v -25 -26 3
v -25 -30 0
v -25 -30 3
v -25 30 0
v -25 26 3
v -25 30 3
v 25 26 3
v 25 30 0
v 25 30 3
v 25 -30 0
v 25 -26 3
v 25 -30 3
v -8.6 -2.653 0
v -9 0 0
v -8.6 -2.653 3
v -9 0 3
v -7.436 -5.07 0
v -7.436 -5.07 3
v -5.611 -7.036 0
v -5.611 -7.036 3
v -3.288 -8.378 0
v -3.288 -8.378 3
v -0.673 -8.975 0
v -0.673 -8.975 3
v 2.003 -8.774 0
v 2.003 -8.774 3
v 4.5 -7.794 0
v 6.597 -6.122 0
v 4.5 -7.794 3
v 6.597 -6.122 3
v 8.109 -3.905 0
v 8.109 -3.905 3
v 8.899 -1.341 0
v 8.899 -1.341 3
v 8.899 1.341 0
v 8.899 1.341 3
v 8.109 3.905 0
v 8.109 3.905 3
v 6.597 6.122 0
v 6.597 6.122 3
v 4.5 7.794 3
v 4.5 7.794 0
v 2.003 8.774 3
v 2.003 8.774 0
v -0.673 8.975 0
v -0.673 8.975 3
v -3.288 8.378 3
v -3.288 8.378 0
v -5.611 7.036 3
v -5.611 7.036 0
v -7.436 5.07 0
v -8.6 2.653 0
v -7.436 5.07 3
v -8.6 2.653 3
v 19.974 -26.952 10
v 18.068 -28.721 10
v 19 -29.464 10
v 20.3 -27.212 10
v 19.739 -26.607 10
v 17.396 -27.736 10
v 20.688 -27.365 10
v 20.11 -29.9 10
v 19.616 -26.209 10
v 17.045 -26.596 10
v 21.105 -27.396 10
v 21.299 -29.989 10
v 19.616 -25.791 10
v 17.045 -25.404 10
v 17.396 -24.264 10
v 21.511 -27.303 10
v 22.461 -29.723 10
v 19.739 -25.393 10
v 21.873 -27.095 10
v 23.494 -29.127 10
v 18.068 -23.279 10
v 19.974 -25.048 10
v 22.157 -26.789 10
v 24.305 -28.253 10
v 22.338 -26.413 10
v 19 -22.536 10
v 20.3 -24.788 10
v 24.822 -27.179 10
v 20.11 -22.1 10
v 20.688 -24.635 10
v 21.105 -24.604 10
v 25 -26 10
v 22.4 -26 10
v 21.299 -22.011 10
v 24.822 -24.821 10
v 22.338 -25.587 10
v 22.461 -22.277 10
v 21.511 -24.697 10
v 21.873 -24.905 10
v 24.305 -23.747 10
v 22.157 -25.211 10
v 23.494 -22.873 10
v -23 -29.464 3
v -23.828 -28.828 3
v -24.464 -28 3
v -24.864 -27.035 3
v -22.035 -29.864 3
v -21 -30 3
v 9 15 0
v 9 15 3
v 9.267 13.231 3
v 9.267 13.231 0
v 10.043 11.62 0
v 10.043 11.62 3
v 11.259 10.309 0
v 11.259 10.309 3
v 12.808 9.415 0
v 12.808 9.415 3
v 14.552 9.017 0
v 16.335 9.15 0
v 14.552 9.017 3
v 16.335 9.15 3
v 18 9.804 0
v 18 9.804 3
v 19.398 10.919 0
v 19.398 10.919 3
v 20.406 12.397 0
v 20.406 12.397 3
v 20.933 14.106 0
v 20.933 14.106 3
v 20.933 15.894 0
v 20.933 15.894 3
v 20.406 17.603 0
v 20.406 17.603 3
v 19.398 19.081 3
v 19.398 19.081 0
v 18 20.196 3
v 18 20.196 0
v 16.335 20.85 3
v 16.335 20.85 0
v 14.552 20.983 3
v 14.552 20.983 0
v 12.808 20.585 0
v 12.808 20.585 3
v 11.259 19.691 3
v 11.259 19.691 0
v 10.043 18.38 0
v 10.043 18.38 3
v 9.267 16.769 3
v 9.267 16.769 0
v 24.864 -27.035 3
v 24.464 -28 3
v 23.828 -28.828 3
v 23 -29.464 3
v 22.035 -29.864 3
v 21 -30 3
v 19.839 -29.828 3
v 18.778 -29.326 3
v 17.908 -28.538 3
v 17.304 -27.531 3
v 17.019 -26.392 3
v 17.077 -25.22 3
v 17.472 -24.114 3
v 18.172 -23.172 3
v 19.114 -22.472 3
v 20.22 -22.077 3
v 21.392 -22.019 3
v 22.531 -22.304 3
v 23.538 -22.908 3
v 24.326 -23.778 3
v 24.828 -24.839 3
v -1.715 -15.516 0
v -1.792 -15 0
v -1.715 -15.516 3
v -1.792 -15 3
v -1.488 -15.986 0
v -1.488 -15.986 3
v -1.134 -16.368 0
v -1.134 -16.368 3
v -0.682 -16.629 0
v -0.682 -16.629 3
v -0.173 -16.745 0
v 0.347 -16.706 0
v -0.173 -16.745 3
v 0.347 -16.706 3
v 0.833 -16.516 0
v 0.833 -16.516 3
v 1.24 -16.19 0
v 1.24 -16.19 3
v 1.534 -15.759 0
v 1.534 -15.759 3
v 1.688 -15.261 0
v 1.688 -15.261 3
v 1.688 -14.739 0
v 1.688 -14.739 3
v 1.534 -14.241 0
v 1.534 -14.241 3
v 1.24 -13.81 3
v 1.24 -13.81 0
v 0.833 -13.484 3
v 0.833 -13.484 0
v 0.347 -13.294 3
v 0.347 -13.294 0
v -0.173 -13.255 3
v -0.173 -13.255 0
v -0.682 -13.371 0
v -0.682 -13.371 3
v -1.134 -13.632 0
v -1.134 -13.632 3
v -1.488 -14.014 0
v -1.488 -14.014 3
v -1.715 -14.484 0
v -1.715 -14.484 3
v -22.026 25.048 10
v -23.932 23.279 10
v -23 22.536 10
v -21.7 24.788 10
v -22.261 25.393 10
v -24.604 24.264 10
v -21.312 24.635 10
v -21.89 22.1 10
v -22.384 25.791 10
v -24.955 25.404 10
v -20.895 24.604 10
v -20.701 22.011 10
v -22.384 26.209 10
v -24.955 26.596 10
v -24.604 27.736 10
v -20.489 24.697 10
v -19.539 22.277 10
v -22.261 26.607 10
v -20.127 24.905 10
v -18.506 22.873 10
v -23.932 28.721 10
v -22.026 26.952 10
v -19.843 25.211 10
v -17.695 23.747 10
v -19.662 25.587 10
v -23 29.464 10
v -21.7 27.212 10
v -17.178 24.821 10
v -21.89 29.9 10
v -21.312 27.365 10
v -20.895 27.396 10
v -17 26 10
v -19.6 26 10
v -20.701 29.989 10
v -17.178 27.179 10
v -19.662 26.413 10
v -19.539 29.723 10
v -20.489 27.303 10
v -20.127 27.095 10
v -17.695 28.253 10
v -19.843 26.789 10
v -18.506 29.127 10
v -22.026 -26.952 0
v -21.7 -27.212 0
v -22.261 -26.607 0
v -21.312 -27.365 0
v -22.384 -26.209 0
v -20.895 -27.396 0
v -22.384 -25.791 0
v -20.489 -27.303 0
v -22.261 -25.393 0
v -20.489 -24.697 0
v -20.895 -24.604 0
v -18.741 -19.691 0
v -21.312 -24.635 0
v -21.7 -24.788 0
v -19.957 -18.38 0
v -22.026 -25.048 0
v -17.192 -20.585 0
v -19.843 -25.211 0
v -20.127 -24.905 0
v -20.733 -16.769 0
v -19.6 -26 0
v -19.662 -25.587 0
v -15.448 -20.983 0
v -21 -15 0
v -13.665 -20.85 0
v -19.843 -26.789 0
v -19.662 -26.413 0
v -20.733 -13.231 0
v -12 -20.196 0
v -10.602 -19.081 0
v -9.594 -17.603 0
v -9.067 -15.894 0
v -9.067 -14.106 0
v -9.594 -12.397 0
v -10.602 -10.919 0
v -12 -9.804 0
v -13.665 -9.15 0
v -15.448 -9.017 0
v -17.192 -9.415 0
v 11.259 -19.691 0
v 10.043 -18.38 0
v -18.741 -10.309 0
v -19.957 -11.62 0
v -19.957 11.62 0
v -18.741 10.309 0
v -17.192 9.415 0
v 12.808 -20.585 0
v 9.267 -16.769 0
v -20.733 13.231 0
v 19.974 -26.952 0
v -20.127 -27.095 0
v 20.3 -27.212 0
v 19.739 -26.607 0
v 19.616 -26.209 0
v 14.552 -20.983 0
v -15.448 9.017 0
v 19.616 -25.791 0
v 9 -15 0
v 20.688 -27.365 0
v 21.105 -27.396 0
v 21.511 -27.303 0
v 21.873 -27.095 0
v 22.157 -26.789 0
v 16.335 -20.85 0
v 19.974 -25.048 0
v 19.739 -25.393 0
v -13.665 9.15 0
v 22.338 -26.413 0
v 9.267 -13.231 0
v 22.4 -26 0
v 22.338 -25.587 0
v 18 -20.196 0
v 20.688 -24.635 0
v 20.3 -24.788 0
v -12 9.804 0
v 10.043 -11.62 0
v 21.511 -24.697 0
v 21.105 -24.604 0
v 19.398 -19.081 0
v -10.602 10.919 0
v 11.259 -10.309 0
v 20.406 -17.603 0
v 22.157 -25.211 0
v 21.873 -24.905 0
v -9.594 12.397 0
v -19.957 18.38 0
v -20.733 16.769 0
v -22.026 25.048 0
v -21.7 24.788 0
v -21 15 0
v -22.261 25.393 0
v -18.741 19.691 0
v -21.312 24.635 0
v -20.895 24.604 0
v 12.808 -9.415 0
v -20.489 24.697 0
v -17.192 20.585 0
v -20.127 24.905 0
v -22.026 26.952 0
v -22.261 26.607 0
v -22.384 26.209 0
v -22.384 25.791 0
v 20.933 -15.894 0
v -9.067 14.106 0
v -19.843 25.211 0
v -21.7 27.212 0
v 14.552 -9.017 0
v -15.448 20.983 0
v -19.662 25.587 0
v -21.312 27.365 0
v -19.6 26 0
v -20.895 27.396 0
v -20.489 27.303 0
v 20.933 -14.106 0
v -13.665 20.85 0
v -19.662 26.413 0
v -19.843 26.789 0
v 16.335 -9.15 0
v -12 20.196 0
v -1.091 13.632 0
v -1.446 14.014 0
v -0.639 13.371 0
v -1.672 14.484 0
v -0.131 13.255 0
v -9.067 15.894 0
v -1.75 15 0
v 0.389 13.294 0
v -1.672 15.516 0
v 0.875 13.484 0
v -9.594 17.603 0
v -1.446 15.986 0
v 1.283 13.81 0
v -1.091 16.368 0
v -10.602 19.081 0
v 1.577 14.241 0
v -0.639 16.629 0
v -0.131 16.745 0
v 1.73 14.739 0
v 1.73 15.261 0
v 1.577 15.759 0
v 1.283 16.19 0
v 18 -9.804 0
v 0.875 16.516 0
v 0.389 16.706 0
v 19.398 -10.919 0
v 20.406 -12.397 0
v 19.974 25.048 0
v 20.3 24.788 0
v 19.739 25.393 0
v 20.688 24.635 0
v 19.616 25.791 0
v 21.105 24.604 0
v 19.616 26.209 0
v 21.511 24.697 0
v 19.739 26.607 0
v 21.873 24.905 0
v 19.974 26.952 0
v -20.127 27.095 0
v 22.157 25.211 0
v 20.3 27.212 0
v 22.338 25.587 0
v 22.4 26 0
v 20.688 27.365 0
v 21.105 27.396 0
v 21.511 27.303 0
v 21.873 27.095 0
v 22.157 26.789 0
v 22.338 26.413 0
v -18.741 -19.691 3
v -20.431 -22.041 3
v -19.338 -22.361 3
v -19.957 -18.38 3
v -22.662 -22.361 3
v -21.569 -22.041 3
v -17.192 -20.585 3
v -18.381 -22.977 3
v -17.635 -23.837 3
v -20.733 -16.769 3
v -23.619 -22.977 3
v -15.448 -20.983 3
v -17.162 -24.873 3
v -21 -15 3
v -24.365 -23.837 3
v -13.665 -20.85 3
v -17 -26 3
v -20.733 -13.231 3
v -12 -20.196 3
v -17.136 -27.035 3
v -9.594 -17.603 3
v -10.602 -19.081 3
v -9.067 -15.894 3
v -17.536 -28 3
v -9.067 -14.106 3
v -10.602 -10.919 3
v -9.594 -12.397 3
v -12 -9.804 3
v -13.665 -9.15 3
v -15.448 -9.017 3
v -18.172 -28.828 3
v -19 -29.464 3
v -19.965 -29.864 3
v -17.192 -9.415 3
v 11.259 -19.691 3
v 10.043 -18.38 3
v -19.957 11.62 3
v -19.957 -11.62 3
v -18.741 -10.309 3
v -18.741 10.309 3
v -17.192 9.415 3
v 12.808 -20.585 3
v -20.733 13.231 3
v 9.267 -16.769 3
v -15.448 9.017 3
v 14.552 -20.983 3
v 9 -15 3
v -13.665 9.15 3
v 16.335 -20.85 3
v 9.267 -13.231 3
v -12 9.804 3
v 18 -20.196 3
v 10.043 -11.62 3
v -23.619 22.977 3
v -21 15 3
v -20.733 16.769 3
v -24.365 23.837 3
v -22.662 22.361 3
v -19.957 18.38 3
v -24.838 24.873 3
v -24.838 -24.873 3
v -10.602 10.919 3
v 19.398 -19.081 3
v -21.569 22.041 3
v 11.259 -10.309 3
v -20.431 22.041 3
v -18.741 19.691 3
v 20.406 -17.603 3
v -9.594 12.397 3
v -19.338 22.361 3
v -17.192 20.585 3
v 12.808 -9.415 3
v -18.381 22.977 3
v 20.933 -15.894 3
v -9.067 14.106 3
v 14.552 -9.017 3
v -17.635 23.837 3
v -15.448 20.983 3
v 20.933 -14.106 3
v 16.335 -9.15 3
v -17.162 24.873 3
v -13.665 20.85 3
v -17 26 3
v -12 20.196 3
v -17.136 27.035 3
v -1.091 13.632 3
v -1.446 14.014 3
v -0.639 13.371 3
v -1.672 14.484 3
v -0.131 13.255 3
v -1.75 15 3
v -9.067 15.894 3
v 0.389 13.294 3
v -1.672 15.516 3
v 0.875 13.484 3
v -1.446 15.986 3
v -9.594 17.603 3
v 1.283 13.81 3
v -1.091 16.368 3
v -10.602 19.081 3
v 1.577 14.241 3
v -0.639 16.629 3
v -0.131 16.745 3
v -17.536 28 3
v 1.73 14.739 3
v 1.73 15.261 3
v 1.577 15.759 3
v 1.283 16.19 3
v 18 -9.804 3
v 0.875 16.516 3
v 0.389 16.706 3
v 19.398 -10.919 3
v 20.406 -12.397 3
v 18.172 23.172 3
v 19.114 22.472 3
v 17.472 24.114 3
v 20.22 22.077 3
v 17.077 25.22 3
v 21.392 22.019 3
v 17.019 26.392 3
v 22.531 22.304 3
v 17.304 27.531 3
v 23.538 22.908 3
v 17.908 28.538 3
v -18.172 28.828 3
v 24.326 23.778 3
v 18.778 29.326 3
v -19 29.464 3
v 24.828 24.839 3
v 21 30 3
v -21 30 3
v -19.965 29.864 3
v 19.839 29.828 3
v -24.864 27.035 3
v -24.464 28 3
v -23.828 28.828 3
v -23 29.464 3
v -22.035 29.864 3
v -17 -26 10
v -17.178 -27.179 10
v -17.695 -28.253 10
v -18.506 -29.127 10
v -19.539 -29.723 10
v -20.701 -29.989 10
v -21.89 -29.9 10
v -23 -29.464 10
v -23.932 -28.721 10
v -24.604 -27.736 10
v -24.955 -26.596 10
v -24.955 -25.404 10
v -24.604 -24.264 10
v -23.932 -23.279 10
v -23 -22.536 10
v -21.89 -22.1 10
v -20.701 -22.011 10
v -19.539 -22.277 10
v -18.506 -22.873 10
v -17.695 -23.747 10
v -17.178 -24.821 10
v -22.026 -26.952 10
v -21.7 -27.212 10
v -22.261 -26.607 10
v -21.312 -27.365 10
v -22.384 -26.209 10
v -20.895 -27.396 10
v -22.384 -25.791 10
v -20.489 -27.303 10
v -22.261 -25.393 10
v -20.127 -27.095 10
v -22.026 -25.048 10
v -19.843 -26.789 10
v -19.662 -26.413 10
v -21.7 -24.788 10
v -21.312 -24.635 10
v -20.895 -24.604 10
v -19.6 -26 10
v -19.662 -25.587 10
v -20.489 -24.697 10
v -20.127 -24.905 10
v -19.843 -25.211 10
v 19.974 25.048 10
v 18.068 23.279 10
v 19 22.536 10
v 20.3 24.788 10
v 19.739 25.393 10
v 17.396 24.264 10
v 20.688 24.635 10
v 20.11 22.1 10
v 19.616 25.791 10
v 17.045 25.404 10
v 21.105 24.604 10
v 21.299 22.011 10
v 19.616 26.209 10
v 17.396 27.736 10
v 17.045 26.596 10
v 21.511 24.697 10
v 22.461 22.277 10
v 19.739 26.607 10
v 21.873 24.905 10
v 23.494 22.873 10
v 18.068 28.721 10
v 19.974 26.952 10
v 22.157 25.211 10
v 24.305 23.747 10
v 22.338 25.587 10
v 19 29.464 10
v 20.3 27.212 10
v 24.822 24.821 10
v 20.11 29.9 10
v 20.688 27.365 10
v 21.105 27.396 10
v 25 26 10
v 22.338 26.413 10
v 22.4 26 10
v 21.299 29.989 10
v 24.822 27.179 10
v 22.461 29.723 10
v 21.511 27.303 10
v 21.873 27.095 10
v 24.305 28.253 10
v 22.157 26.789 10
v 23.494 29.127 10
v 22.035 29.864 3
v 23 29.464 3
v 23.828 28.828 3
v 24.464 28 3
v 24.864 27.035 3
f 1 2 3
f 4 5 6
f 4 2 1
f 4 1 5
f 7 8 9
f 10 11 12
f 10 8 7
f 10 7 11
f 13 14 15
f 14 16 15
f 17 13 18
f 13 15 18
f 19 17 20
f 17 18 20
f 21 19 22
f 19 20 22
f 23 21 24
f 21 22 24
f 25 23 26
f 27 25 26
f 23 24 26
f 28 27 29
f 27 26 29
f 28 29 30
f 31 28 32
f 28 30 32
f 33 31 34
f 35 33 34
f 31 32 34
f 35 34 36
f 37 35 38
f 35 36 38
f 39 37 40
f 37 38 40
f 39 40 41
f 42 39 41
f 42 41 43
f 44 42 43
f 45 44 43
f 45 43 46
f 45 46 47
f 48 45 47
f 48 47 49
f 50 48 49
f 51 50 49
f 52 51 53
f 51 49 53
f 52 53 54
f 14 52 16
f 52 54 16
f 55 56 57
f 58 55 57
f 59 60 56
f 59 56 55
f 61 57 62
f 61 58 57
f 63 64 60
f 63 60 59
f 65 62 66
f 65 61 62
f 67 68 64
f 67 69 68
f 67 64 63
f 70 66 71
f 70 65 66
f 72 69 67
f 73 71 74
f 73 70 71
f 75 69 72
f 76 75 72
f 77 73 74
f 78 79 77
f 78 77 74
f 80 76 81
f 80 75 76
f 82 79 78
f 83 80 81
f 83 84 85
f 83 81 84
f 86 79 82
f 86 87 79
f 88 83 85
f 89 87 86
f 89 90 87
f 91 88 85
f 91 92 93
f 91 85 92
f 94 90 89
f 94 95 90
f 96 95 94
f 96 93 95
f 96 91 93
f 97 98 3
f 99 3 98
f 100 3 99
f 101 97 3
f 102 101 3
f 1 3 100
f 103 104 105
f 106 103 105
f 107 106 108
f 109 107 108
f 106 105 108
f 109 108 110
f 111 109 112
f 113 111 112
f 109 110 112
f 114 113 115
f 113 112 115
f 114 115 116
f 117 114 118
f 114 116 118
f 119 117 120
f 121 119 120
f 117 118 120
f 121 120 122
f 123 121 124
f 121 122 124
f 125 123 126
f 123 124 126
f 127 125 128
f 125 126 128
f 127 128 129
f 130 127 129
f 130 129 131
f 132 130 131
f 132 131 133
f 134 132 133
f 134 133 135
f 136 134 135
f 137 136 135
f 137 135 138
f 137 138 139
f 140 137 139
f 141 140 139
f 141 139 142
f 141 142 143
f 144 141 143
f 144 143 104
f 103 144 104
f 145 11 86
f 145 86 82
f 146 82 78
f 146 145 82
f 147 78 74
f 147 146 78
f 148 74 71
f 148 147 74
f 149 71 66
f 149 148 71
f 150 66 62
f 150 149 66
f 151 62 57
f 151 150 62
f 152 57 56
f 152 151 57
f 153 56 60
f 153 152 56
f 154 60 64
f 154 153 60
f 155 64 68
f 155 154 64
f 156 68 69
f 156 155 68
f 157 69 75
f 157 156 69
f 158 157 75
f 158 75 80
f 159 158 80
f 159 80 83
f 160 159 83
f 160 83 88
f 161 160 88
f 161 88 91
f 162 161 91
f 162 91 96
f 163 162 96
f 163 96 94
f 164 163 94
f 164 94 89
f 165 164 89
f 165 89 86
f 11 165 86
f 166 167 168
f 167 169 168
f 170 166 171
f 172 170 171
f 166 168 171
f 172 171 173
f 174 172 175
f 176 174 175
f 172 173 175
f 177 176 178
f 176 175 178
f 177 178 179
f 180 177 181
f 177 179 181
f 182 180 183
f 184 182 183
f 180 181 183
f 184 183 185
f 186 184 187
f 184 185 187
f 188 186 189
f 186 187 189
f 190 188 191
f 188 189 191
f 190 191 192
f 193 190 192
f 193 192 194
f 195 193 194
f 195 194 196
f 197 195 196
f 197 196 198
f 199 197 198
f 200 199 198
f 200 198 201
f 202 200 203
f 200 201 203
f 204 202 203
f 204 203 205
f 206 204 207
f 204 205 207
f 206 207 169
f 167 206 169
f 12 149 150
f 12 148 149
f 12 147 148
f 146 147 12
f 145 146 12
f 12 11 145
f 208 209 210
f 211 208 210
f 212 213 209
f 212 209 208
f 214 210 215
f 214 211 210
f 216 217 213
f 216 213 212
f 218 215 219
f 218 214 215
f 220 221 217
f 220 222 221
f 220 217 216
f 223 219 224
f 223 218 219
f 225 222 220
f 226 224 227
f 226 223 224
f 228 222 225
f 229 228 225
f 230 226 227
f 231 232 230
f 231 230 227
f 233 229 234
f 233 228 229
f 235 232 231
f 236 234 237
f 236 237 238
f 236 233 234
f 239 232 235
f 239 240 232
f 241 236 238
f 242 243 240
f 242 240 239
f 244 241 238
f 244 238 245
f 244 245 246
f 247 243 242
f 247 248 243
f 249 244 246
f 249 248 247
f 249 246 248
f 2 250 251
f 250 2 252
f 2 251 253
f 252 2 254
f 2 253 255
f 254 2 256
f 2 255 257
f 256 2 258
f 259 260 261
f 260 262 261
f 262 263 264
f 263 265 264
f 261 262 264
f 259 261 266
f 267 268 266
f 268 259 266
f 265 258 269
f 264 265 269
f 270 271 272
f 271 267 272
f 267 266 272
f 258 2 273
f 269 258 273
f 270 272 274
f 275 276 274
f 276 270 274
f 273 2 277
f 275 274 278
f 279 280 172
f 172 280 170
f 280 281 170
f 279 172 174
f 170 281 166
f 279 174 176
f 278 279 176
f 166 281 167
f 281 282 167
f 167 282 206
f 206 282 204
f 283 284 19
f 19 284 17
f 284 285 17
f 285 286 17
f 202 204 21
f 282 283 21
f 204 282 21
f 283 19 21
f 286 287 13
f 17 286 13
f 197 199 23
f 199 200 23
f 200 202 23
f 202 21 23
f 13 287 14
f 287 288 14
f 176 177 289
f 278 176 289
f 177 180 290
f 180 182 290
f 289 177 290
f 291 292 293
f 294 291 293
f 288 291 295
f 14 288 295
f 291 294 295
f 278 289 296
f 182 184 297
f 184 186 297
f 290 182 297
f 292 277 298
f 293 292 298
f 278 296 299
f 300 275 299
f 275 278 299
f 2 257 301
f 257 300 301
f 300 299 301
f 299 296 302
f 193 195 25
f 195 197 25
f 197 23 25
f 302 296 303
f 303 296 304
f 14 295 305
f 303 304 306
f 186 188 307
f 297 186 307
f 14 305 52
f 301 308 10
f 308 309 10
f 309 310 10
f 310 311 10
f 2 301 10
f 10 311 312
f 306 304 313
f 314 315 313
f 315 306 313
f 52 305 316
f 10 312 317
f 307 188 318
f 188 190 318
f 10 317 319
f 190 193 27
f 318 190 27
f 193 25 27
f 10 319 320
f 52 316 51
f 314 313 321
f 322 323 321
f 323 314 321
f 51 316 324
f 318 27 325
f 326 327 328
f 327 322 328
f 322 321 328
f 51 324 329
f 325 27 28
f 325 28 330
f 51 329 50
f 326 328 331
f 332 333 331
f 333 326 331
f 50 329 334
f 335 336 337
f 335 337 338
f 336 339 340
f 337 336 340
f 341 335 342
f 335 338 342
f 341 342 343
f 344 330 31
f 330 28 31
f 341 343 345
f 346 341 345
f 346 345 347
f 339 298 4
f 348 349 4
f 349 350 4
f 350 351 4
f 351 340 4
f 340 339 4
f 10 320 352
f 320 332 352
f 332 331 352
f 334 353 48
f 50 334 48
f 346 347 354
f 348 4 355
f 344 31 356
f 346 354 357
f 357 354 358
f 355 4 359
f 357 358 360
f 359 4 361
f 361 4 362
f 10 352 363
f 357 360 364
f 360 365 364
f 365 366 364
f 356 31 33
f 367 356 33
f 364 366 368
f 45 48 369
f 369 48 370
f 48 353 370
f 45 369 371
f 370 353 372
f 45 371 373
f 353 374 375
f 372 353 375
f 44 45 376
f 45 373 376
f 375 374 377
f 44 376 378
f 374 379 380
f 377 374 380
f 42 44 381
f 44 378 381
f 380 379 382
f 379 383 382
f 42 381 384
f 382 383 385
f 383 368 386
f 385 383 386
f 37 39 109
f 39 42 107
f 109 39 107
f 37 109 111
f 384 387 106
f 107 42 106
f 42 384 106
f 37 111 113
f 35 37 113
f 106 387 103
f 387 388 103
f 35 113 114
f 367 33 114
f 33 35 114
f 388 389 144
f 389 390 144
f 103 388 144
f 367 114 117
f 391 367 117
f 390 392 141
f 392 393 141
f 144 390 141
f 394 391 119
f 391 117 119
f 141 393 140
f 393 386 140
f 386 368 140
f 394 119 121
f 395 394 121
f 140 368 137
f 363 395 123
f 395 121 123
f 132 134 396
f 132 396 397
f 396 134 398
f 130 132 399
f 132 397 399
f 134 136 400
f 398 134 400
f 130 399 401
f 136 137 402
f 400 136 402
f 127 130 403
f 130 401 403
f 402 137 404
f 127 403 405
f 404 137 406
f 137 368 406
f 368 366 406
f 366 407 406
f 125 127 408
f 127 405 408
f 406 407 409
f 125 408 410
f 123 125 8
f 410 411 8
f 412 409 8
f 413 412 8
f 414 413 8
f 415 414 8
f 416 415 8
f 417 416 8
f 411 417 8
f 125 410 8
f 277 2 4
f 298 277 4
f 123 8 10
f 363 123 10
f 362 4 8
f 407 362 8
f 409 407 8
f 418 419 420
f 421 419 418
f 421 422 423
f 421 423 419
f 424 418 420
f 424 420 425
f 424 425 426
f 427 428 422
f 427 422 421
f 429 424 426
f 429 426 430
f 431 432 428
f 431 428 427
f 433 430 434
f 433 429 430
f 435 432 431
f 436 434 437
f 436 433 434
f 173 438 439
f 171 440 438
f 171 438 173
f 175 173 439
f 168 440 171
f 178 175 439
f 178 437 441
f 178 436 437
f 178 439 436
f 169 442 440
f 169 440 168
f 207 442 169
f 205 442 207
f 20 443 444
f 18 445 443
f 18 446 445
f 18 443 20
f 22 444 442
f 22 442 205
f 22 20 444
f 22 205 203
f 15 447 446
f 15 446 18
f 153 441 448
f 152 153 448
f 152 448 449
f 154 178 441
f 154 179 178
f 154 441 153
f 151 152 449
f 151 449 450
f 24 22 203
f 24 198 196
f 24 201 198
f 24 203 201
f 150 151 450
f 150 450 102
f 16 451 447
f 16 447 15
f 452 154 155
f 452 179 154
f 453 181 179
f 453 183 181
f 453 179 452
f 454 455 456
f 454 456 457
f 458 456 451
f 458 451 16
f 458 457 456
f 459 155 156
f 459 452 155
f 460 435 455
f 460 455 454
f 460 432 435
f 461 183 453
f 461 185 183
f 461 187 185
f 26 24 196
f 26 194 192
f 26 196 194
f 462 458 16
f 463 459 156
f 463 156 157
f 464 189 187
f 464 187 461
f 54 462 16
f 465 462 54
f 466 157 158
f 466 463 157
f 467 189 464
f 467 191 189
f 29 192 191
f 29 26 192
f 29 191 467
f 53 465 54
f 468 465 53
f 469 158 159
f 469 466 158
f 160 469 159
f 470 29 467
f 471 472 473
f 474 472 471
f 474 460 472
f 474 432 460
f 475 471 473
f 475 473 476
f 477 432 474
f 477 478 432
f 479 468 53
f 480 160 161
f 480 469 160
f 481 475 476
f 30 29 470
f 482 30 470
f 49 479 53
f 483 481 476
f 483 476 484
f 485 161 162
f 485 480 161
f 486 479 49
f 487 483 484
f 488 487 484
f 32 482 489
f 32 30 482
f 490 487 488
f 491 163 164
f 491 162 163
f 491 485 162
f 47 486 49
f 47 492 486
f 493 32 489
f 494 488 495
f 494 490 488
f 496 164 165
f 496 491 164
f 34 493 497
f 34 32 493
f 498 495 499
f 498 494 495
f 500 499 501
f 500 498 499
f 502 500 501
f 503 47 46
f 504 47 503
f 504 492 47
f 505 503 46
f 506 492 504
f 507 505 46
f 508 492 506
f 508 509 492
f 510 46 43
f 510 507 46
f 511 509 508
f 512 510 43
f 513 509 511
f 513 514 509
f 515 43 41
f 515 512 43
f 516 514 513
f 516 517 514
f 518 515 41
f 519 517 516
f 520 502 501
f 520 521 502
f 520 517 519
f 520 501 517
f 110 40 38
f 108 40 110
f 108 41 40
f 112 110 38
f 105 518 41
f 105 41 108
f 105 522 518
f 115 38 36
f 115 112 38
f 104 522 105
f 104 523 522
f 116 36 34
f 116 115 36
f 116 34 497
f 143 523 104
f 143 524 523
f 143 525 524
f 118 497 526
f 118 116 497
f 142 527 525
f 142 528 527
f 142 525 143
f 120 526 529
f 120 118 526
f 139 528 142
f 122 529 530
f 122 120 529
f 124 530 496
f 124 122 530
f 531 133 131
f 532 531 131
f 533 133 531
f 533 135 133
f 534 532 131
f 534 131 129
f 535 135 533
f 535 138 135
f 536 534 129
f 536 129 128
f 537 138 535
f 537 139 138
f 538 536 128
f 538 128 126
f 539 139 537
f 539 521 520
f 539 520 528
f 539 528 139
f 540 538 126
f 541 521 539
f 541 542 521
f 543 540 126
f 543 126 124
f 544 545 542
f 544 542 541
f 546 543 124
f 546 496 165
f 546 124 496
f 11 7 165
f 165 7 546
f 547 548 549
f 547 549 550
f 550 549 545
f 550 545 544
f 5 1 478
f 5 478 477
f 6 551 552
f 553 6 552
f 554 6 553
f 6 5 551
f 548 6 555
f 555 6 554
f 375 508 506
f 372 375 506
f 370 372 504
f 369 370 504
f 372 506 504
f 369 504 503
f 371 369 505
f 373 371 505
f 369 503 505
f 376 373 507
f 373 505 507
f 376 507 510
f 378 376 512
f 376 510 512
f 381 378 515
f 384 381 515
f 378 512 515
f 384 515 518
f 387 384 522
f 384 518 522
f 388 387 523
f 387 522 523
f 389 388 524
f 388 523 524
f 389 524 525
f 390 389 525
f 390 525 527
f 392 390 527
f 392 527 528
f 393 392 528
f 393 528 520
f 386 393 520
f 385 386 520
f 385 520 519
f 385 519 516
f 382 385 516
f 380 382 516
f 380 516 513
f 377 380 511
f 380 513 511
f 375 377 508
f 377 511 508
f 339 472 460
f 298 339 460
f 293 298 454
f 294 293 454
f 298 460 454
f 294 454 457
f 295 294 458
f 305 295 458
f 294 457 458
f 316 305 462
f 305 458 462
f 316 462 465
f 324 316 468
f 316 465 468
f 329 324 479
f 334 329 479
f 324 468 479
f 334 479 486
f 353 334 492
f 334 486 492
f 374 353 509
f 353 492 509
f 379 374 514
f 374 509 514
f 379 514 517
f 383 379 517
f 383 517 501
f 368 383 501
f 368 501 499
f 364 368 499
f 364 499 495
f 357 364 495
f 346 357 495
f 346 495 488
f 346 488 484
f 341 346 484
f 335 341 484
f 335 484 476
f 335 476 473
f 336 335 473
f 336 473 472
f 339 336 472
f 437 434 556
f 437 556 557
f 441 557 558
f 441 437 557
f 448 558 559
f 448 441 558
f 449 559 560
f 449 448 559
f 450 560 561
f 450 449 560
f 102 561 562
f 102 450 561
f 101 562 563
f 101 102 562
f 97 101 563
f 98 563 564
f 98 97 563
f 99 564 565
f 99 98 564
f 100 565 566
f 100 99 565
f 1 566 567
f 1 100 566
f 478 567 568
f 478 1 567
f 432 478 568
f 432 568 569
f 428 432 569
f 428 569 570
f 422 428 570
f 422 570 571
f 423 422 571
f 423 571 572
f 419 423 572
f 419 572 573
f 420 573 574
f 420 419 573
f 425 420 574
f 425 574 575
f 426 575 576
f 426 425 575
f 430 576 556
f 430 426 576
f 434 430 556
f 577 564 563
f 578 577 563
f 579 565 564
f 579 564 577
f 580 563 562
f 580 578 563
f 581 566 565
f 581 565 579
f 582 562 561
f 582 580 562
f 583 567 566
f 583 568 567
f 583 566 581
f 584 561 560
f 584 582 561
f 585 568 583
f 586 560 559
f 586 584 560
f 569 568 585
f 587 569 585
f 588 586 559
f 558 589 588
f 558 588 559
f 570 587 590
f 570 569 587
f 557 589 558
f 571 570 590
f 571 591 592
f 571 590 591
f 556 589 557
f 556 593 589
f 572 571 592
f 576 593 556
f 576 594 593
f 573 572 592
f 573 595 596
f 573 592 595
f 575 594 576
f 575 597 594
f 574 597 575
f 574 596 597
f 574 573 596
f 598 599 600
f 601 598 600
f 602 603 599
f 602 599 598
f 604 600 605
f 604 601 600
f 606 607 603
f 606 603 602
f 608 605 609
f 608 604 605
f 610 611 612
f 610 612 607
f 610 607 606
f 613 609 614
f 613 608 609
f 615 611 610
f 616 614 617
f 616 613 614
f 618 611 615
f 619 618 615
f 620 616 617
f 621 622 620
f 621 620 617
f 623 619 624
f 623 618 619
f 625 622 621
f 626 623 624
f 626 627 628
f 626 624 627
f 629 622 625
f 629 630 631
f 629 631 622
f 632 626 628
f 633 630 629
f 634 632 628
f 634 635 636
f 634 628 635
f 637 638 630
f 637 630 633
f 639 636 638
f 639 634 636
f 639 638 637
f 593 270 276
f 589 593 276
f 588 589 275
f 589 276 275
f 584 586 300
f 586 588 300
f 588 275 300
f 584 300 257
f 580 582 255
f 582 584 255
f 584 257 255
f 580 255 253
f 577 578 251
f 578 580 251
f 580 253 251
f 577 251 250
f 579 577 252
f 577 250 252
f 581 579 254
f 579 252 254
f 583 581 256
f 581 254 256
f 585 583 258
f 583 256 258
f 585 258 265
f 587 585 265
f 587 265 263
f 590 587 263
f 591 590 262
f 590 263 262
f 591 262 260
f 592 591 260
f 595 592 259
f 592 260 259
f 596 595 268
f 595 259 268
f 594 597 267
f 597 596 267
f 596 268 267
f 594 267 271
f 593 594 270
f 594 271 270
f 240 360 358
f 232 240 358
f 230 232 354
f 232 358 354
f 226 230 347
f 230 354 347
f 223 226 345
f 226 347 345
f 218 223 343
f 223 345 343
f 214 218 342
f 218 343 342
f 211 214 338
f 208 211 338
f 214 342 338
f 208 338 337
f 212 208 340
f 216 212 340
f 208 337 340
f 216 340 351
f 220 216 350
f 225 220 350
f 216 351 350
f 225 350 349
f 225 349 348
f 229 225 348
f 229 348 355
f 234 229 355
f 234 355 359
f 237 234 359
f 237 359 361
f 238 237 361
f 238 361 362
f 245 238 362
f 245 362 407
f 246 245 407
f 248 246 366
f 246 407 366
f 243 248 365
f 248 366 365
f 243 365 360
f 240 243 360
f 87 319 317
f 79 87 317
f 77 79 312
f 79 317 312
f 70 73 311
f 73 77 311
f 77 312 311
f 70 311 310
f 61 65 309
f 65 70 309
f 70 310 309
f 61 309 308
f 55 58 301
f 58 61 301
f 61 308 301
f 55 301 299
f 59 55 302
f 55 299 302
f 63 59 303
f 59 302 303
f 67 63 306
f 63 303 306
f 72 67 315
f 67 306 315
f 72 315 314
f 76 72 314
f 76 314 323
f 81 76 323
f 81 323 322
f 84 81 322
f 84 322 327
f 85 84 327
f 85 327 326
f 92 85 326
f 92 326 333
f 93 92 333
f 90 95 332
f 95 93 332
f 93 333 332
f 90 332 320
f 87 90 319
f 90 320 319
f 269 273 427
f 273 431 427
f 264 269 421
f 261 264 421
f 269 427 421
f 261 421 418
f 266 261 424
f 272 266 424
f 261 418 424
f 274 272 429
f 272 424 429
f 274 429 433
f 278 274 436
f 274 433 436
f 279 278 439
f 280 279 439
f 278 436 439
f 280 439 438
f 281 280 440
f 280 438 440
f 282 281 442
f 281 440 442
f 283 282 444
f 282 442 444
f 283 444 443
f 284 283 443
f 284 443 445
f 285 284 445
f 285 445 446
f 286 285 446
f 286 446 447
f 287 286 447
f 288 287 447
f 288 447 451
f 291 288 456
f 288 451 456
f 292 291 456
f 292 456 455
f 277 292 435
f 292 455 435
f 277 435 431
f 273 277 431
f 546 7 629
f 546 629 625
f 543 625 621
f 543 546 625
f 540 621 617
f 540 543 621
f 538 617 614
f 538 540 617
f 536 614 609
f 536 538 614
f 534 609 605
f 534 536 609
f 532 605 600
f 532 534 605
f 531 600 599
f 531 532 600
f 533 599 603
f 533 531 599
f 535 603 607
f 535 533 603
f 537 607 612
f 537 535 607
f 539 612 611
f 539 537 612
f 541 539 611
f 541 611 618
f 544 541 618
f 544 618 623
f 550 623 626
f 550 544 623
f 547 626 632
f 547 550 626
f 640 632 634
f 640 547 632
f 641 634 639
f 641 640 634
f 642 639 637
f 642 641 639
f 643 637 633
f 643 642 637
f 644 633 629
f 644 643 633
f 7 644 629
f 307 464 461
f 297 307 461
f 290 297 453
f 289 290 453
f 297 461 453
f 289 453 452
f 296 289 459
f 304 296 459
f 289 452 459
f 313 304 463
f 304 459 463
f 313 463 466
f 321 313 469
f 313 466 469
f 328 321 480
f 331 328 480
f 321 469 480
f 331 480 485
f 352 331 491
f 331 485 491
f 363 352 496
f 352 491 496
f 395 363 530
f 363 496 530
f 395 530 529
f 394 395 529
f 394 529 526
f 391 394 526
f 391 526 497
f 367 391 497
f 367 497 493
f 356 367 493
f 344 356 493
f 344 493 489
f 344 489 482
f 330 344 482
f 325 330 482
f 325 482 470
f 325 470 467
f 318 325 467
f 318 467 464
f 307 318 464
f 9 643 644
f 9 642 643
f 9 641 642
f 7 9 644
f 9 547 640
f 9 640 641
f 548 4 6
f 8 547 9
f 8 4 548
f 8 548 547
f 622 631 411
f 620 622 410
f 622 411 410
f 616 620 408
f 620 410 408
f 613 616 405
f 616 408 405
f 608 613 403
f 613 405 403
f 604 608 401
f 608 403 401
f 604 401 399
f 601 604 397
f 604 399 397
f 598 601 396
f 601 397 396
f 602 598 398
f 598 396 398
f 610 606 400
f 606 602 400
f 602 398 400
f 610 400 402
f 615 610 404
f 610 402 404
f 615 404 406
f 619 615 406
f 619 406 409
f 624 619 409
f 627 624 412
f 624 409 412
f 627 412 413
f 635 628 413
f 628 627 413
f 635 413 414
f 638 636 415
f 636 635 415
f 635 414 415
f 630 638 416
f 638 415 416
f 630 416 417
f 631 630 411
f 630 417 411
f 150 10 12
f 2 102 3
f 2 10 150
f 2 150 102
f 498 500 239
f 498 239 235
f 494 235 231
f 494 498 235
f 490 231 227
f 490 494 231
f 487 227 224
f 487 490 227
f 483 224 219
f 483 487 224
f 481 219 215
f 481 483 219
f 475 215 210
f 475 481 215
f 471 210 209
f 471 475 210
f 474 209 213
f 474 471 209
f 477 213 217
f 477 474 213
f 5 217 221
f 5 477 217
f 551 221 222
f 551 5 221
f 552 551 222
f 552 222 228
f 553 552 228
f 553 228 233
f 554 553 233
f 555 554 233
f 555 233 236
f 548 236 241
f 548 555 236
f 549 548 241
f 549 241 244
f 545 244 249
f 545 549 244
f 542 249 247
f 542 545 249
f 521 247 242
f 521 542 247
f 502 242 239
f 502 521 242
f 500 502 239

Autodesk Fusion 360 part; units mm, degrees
sketch "Sketch1" plane through (0, 0, 0) normal (0, 0, 1) x (1, 0, 0)
  line L0 (21, -26) -> (-21, -26) construction
  line L1 (-21, -26) -> (-21, 26) construction
  line L2 (-21, 26) -> (21, 26) construction
  line L3 (21, 26) -> (21, -26) construction
  line L4 (21, -26) -> (-21, 26) construction
  line L5 (-21, -26) -> (21, 26) construction
  circle A0 centre (-21, 26) radius 1.4
  circle A1 centre (21, 26) radius 1.4
  circle A2 centre (-21, -26) radius 1.4
  circle A3 centre (21, -26) radius 1.4
  line L6 (10, 45) -> (-10, 45) construction
  line L7 (-10, 45) -> (-10, -45) construction
  line L8 (-10, -45) -> (10, -45) construction
  line L9 (10, -45) -> (10, 45) construction
  line L10 (10, 45) -> (-10, -45) construction
  line L11 (-10, 45) -> (10, -45) construction
  circle A4 centre (-10, 45) radius 1.625
  circle A5 centre (10, 45) radius 1.625
  circle A6 centre (21, -26) radius 4
  circle A7 centre (-21, -26) radius 4
  circle A8 centre (-21, 26) radius 4
  circle A9 centre (21, 26) radius 4
  circle A10 centre (-10, 45) radius 4
  circle A11 centre (10, 45) radius 4
  line L12 (25, -26) -> (-25, -26) construction
  line L13 (-25, -26) -> (-25, 26) construction
  line L14 (-25, 26) -> (25, 26) construction
  line L15 (25, 26) -> (25, -26) construction
  line L16 (25, -26) -> (-25, 26) construction
  line L17 (-25, -26) -> (25, 26) construction
  line L18 (21, -30) -> (-21, -30) construction
  line L19 (-21, -30) -> (-21, 30) construction
  line L20 (-21, 30) -> (21, 30) construction
  line L21 (21, 30) -> (21, -30) construction
  line L22 (21, -30) -> (-21, 30) construction
  line L23 (-21, -30) -> (21, 30) construction
  line L24 (25, -30) -> (-25, -30)
  line L25 (-25, -30) -> (-25, 30)
  line L26 (-25, 30) -> (25, 30)
  line L27 (25, 30) -> (25, -30)
  line L28 (-21, 26) -> (21, 26)
  line L29 (21, 26) -> (21, 49.335)
  line L30 (21, 49.335) -> (-21, 49.335)
  line L31 (-21, 49.335) -> (-21, 26)
  dimension "d1" = 52
  dimension "d2" = 42
  dimension "d3" = 2.8
  dimension "d4" = 2.8
  dimension "d5" = 2.8
  dimension "d6" = 2.8
  dimension "d7" = 90
  dimension "d8" = 20
  dimension "d9" = 3.25
  dimension "d10" = 3.25
  dimension "d11" = 8
  dimension "d12" = 8
  dimension "d13" = 8
  dimension "d14" = 8
  dimension "d15" = 8
  dimension "d16" = 8
  dimension "d17" = 60
  dimension "d18" = 50
extrude "Extrude1" add sketch "Sketch1" along normal blind 3 contours A6 A7 A8 A9 L24 L25 L27 L28 | A8 A9 L26 L28 | A8 L25 L26 | A9 L26 L27 | A7 L24 L25 | A6 L24 L27
extrude "Extrude2" add sketch "Sketch1" along normal blind 10 contours A0 A8 L28 L31 | A0 A8 L28 L31 | A1 A9 L28 L29 | A1 A9 L28 L29 | A7 | A6
sketch "Sketch2" plane through (0, 0, 3) normal (0, 0, 1) x (-1, 0, 0)
  line L0 (25, -26) -> (25, 26)
  line L1 (21, 30) -> (-21, 30)
  line L2 (-25, 26) -> (-25, -26)
  circle A0 centre (0, -15) radius 1.75
  circle A1 centre (0.0425, 15) radius 1.75
  line L3 (-21, -30) -> (21, -30)
  circle A2 centre (0, 0) radius 9
  circle A3 centre (15, -15) radius 6
  circle A4 centre (-15, -15) radius 6
  circle A5 centre (-15, 15) radius 6
  circle A6 centre (15, 15) radius 6
  arc A7 (-21, -30) -> (-25, -26) centre (-21, -26) ccw
  arc A8 (25, -26) -> (21, -30) centre (21, -26) ccw
  arc A9 (21, 30) -> (25, 26) centre (21, 26) ccw
  arc A10 (-25, 26) -> (-21, 30) centre (-21, 26) ccw
  dimension "d23" = 3.5
  dimension "d24" = 3.5
  dimension "d25" = 15
  dimension "d26" = 15
  dimension "d29" = 18
  dimension "d30" = 12
  dimension "d31" = 12
  dimension "d32" = 12
  dimension "d33" = 12
  dimension "d34" = 10
  dimension "d35" = 10
  dimension "d36" = 10
  dimension "d37" = 10
  dimension "d38" = 15
  dimension "d39" = 15
  dimension "d40" = 15
  dimension "d41" = 15
extrude "Extrude3" cut sketch "Sketch2" against normal blind 9 contours A0 | A1 | A2 | A3 | A4 | A5 | A6
equation "d35 = d34"
equation "d36 = d34"
equation "d37 = d34"
equation "d39 = d38"
equation "d40 = d38"
equation "d41 = d38"
